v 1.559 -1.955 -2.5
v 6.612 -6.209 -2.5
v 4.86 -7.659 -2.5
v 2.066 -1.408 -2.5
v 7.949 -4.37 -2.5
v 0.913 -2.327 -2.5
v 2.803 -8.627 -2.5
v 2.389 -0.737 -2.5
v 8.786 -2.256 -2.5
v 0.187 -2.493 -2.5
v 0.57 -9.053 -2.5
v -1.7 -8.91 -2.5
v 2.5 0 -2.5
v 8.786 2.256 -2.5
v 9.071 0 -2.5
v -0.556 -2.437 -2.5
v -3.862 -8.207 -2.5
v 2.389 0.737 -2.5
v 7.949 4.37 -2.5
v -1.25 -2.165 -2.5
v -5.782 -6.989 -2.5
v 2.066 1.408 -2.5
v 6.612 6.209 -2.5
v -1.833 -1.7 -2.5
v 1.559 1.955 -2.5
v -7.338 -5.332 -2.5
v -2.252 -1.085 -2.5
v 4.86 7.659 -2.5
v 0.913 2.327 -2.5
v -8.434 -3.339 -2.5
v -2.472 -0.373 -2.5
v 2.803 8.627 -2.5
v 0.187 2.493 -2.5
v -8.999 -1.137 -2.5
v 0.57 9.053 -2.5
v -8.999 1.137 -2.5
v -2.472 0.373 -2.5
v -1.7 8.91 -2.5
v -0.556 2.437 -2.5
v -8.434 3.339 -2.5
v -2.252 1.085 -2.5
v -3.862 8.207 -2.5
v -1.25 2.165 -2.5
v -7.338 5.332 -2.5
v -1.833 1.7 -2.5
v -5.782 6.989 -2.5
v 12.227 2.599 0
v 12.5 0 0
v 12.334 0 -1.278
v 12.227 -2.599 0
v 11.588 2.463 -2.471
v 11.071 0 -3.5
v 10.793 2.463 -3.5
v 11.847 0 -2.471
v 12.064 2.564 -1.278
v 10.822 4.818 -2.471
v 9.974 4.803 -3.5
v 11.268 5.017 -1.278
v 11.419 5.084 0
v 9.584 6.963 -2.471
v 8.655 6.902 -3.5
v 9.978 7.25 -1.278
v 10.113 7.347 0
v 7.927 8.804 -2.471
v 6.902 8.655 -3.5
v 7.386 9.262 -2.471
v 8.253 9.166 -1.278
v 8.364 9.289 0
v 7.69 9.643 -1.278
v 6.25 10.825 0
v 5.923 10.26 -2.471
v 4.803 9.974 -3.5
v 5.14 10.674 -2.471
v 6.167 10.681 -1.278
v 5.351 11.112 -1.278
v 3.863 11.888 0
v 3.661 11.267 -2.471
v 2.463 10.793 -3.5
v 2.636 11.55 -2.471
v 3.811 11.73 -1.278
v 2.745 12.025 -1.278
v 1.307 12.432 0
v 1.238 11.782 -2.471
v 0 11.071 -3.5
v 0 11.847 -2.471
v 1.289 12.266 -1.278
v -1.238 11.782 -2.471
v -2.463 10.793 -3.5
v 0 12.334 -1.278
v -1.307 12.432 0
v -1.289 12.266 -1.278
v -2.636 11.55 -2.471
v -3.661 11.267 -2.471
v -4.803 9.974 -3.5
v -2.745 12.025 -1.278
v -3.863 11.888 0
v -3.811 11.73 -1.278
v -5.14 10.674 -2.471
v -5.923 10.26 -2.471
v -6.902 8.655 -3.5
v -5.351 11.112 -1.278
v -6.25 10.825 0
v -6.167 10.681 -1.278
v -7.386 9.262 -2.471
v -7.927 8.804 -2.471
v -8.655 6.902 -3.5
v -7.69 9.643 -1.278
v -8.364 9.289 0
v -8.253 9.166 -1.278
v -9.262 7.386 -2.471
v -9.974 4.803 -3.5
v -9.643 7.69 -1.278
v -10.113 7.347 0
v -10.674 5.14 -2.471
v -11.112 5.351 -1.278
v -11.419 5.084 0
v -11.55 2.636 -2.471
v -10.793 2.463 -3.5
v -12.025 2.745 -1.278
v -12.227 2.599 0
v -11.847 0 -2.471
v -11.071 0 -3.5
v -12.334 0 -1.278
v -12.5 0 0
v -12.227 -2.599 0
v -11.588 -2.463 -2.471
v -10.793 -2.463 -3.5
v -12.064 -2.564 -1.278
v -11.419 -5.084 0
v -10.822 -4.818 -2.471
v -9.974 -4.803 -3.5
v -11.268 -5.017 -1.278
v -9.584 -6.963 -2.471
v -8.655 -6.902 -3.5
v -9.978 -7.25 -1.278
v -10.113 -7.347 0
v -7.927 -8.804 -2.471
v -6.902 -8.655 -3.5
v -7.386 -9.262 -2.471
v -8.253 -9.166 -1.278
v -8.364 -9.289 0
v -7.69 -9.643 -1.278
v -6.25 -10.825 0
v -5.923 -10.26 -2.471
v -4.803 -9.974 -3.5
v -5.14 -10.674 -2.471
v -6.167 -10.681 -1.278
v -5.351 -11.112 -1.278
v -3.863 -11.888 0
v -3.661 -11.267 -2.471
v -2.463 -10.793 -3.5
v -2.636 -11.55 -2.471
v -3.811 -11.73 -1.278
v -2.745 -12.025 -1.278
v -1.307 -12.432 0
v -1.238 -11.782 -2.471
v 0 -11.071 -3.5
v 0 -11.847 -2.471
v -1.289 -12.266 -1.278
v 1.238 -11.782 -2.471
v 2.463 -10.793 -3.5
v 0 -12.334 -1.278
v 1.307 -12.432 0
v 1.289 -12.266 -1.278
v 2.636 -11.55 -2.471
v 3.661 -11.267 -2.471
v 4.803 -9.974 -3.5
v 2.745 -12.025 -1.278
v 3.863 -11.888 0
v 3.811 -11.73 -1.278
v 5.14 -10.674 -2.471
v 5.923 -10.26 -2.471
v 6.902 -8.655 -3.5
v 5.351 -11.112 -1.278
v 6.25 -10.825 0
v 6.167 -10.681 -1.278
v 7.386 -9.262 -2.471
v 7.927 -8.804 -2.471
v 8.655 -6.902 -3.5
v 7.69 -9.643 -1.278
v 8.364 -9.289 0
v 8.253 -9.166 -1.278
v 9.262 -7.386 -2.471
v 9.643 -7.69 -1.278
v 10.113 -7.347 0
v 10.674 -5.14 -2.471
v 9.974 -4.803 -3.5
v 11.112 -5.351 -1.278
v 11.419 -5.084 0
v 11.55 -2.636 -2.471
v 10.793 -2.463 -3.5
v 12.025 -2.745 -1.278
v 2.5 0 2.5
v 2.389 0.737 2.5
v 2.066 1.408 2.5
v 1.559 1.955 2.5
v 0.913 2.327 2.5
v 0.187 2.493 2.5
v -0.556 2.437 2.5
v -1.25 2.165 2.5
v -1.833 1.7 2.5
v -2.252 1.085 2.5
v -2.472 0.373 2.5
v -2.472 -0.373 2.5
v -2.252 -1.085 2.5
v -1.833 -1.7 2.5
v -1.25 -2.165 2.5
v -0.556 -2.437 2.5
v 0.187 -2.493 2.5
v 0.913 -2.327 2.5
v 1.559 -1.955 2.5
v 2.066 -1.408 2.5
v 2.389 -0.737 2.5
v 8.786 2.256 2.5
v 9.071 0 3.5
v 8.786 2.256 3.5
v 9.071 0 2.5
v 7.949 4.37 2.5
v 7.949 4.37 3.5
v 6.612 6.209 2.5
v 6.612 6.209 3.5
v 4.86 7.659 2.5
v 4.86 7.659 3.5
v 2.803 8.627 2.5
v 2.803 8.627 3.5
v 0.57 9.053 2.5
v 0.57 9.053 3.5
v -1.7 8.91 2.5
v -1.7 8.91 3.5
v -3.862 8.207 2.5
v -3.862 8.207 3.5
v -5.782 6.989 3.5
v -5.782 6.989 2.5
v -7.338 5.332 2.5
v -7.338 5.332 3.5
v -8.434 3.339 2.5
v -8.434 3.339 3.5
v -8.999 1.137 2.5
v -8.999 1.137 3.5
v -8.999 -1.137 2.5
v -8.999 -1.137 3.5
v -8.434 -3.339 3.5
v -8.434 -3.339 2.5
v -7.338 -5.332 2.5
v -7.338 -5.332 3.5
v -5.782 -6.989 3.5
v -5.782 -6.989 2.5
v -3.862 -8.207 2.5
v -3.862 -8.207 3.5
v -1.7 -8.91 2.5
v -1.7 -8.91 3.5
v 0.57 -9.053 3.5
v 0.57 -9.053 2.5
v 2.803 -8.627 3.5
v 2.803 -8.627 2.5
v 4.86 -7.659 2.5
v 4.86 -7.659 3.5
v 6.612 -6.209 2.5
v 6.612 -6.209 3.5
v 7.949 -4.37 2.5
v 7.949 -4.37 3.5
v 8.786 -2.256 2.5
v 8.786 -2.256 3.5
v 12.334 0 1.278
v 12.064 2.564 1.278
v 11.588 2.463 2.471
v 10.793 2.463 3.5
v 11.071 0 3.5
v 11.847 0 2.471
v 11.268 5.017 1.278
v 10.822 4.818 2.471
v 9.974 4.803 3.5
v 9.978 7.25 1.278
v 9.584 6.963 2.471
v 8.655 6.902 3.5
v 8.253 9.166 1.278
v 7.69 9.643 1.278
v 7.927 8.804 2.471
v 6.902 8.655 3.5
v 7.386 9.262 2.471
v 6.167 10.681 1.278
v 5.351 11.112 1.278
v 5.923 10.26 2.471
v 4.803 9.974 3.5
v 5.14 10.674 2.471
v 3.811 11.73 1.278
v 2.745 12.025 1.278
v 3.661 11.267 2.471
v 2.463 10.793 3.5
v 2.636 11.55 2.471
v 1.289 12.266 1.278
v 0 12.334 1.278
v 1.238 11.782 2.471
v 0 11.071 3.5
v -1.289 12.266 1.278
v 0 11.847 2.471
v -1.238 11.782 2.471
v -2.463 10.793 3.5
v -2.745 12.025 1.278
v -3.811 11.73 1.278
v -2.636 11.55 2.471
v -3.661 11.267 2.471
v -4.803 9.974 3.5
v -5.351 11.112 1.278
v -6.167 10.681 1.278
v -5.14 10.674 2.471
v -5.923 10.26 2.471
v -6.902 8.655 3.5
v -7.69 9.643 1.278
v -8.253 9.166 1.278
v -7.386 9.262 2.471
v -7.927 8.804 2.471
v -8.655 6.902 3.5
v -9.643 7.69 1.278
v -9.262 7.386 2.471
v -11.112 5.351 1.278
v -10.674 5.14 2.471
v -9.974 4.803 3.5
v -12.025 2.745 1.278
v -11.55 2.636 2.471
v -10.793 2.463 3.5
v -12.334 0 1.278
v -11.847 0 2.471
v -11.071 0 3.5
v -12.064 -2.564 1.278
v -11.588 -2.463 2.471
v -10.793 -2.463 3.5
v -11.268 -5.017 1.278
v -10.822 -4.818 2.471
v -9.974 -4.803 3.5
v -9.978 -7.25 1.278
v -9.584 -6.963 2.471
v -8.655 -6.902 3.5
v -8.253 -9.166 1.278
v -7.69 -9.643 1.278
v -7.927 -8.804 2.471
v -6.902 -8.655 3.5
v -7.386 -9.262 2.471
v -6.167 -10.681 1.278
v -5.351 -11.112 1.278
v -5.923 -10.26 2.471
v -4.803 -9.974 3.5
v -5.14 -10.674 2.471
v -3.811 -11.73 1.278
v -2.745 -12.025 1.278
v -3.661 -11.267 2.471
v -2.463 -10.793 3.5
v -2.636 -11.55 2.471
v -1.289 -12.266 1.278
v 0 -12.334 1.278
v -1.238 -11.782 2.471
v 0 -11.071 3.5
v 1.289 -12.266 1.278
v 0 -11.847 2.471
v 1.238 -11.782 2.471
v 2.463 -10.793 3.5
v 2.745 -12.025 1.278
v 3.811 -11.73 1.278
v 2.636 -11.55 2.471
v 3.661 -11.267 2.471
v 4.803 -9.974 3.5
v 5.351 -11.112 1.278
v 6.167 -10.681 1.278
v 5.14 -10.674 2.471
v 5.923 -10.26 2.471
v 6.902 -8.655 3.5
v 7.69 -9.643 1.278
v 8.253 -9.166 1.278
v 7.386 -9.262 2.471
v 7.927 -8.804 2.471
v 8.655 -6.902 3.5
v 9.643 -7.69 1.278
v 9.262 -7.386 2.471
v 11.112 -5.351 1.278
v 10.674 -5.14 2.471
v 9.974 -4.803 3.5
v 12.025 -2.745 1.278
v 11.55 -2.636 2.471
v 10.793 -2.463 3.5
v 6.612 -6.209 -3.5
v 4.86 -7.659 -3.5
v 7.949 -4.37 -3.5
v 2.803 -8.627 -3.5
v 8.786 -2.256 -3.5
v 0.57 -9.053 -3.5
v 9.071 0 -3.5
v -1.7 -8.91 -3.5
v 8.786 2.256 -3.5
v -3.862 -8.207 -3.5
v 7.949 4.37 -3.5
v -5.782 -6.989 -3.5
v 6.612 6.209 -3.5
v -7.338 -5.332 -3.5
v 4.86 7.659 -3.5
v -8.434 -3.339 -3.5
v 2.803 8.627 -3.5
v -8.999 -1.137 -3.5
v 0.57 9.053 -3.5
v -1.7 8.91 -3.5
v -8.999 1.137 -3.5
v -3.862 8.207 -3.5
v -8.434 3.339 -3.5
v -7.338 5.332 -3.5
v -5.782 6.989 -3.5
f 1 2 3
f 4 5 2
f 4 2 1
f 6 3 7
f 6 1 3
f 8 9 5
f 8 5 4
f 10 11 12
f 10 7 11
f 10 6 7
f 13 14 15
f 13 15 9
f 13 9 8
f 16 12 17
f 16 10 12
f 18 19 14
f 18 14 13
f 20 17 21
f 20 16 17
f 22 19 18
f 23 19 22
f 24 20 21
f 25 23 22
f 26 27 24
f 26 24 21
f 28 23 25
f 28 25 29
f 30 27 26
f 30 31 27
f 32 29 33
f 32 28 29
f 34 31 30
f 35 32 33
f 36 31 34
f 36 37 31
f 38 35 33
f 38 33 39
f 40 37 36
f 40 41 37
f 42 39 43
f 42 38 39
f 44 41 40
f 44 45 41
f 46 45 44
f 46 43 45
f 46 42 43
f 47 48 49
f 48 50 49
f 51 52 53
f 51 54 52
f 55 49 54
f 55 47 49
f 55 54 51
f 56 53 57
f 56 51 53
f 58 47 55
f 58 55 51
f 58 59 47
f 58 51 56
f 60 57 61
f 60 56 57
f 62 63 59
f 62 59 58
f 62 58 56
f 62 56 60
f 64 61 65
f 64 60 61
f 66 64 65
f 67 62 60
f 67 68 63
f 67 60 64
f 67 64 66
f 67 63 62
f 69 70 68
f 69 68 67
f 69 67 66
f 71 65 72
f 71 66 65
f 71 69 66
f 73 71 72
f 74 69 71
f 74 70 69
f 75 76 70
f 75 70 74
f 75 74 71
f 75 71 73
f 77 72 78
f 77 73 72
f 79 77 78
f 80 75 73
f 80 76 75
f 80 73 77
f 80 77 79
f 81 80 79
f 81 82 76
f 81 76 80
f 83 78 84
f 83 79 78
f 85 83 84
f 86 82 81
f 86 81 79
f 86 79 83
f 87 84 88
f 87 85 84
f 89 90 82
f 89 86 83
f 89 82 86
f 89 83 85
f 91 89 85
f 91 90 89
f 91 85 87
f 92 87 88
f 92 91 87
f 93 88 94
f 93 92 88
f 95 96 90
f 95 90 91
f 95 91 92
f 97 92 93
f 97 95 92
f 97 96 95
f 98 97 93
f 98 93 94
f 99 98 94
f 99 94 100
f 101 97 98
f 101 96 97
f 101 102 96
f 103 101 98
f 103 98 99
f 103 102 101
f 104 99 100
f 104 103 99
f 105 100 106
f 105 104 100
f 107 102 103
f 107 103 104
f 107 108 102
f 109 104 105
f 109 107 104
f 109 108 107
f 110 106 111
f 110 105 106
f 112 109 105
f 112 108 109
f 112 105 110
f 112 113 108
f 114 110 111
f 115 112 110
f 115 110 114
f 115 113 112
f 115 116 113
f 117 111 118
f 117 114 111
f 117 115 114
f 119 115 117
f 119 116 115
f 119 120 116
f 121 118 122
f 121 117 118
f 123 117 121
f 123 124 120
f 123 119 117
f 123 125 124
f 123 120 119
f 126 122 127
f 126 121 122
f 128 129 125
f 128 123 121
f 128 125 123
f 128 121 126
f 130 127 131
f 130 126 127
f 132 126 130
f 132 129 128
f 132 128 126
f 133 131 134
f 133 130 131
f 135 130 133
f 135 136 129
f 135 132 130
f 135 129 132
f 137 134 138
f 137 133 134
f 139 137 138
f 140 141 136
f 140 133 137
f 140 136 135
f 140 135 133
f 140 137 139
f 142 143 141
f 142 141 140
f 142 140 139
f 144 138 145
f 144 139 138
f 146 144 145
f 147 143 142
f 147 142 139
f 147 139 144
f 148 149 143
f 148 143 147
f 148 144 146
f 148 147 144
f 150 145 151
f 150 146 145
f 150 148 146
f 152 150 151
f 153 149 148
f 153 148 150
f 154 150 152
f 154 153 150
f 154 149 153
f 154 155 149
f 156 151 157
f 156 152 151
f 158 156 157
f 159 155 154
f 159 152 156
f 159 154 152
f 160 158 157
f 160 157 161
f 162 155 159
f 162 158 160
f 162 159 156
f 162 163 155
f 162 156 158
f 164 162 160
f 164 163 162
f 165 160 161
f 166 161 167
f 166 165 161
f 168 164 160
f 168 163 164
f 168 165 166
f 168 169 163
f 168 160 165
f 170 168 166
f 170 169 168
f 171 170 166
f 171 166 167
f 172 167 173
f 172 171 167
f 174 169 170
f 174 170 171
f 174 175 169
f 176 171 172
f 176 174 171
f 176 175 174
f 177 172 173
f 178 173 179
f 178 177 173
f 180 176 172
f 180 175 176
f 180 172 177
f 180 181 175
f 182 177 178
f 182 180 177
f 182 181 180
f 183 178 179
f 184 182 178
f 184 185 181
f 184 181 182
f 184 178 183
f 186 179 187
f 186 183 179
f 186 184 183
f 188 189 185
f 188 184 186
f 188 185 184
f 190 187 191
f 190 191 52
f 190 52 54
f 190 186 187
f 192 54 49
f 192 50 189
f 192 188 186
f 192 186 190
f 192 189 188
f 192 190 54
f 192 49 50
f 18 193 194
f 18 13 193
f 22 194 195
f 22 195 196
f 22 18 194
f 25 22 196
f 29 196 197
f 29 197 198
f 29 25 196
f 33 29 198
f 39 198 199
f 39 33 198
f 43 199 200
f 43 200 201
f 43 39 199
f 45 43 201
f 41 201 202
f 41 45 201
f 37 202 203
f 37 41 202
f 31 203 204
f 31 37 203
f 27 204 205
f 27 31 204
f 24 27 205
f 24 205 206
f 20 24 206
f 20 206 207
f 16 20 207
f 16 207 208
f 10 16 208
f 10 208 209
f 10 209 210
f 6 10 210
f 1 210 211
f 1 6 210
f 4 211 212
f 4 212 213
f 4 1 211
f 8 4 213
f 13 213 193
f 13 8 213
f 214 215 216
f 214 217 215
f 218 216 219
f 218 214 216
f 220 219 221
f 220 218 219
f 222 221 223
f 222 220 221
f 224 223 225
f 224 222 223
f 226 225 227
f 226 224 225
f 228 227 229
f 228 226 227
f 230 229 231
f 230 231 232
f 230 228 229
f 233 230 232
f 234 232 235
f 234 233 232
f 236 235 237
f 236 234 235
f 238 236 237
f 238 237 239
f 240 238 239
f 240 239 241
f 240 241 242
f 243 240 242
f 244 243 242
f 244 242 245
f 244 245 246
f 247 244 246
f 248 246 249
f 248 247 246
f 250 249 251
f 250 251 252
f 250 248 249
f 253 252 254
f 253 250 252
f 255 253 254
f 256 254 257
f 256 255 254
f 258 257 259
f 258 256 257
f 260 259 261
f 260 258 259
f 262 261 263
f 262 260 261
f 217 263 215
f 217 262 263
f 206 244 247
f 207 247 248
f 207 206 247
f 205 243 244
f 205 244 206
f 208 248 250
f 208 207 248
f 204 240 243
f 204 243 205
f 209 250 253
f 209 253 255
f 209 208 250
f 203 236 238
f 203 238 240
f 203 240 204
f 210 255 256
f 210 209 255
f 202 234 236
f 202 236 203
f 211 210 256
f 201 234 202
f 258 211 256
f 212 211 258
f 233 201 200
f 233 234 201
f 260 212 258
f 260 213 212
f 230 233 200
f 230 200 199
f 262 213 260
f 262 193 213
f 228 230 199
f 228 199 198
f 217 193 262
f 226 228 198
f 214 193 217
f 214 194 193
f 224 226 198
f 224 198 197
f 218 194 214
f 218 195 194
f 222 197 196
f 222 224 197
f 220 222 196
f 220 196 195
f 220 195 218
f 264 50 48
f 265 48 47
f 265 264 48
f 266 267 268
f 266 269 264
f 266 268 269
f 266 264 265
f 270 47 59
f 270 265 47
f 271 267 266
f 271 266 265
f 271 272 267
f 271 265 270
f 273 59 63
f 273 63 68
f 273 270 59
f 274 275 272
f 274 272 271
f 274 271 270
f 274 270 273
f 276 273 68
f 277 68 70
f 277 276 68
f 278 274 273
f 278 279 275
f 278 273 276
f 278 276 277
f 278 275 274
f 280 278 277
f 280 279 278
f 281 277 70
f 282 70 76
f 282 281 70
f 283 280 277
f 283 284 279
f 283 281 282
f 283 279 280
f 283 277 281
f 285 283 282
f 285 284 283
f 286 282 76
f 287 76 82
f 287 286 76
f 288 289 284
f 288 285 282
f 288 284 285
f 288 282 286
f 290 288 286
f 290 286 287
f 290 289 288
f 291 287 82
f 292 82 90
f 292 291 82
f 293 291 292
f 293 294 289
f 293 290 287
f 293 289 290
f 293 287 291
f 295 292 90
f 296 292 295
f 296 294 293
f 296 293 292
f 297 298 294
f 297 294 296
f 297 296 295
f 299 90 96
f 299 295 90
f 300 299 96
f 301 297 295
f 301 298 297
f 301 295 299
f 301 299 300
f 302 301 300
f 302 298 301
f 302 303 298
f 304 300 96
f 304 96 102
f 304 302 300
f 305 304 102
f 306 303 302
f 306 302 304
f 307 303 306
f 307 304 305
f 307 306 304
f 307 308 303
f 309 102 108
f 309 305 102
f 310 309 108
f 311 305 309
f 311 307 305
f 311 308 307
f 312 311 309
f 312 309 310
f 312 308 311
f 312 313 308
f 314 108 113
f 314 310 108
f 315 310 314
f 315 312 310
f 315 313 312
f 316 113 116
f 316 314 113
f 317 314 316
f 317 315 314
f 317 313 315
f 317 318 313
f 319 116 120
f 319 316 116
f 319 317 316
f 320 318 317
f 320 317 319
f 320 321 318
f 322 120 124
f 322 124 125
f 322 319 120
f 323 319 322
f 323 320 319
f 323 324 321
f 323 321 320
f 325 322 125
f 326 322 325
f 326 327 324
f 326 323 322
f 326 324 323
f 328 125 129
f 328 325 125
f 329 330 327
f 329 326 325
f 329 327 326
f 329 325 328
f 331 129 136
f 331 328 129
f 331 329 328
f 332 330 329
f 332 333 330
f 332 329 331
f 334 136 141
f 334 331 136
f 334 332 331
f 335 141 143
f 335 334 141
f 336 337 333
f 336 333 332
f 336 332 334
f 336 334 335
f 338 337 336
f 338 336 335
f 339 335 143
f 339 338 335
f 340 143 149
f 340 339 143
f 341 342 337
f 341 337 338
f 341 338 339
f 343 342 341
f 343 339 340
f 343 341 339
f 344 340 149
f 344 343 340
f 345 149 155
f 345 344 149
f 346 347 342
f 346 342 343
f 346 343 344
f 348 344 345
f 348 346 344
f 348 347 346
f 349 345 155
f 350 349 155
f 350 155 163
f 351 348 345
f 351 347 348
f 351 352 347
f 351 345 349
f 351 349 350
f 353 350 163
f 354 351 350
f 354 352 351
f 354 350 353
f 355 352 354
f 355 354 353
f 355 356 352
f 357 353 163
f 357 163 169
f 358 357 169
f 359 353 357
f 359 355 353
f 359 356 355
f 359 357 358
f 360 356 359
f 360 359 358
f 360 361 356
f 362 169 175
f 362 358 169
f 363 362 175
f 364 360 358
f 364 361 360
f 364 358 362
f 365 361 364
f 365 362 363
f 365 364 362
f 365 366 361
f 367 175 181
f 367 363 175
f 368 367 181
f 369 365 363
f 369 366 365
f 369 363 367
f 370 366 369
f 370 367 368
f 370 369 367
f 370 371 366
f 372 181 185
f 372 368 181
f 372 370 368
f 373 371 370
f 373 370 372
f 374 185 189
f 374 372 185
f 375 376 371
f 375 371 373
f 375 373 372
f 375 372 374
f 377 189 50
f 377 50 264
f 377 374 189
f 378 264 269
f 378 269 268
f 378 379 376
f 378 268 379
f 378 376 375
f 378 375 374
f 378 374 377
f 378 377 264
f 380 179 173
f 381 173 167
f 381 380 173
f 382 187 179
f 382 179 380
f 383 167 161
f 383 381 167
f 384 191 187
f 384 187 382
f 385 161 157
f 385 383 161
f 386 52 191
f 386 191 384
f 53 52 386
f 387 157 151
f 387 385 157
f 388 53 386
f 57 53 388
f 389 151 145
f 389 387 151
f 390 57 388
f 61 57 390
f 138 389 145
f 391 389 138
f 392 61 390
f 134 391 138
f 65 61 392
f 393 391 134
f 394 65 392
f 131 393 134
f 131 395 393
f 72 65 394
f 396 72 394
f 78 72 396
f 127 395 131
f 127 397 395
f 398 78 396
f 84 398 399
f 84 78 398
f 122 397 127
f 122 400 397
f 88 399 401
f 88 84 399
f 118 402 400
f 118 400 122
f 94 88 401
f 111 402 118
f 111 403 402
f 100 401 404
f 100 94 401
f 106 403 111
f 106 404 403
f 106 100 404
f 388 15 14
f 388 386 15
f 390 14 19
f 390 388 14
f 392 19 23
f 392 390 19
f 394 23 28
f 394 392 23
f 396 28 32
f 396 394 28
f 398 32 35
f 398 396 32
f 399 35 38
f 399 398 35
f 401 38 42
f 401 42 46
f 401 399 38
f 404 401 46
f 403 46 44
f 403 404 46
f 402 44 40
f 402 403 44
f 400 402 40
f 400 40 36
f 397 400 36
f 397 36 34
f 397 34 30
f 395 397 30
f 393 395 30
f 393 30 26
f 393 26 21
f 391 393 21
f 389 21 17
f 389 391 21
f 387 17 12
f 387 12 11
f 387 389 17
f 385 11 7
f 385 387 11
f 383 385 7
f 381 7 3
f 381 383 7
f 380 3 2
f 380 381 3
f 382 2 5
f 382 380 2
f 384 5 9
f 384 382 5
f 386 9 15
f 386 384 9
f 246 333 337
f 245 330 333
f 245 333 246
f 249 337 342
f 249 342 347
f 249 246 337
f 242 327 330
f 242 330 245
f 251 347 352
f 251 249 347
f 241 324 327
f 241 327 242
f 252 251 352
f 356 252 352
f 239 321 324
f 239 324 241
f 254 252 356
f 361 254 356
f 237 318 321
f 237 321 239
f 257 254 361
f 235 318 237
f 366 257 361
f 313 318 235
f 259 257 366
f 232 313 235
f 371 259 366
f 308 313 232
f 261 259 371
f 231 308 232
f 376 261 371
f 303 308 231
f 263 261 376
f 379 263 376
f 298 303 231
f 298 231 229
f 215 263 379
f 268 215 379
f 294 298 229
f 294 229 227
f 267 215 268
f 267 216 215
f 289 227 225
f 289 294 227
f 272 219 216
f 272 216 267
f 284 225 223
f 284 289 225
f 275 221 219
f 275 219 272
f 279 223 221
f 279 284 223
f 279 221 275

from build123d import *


with BuildPart() as f1:
    # F0 (on Front) → F1 (revolve)
    with BuildSketch(Plane.XZ):
        with BuildLine():
            ThreePointArc((11.070714, -3.5), (12.128908, -1.890295), (12.5, 0))
            ThreePointArc((12.5, 0), (12.128908, 1.890295), (11.070714, 3.5))
            Line((11.070714, 3.5), (9.070714, 3.5))
            Line((9.070714, 3.5), (9.070714, 2.5))
            Line((9.070714, 2.5), (2.5, 2.5))
            Line((2.5, 2.5), (2.5, 0))
            Line((2.5, 0), (2.5, -2.5))
            Line((2.5, -2.5), (9.070714, -2.5))
            Line((9.070714, -2.5), (9.070714, -3.5))
            Line((9.070714, -3.5), (11.070714, -3.5))
        make_face()
    revolve(axis=Axis((0, 0, 4.247276), (0, 0, 1)))


solid = f1.part
